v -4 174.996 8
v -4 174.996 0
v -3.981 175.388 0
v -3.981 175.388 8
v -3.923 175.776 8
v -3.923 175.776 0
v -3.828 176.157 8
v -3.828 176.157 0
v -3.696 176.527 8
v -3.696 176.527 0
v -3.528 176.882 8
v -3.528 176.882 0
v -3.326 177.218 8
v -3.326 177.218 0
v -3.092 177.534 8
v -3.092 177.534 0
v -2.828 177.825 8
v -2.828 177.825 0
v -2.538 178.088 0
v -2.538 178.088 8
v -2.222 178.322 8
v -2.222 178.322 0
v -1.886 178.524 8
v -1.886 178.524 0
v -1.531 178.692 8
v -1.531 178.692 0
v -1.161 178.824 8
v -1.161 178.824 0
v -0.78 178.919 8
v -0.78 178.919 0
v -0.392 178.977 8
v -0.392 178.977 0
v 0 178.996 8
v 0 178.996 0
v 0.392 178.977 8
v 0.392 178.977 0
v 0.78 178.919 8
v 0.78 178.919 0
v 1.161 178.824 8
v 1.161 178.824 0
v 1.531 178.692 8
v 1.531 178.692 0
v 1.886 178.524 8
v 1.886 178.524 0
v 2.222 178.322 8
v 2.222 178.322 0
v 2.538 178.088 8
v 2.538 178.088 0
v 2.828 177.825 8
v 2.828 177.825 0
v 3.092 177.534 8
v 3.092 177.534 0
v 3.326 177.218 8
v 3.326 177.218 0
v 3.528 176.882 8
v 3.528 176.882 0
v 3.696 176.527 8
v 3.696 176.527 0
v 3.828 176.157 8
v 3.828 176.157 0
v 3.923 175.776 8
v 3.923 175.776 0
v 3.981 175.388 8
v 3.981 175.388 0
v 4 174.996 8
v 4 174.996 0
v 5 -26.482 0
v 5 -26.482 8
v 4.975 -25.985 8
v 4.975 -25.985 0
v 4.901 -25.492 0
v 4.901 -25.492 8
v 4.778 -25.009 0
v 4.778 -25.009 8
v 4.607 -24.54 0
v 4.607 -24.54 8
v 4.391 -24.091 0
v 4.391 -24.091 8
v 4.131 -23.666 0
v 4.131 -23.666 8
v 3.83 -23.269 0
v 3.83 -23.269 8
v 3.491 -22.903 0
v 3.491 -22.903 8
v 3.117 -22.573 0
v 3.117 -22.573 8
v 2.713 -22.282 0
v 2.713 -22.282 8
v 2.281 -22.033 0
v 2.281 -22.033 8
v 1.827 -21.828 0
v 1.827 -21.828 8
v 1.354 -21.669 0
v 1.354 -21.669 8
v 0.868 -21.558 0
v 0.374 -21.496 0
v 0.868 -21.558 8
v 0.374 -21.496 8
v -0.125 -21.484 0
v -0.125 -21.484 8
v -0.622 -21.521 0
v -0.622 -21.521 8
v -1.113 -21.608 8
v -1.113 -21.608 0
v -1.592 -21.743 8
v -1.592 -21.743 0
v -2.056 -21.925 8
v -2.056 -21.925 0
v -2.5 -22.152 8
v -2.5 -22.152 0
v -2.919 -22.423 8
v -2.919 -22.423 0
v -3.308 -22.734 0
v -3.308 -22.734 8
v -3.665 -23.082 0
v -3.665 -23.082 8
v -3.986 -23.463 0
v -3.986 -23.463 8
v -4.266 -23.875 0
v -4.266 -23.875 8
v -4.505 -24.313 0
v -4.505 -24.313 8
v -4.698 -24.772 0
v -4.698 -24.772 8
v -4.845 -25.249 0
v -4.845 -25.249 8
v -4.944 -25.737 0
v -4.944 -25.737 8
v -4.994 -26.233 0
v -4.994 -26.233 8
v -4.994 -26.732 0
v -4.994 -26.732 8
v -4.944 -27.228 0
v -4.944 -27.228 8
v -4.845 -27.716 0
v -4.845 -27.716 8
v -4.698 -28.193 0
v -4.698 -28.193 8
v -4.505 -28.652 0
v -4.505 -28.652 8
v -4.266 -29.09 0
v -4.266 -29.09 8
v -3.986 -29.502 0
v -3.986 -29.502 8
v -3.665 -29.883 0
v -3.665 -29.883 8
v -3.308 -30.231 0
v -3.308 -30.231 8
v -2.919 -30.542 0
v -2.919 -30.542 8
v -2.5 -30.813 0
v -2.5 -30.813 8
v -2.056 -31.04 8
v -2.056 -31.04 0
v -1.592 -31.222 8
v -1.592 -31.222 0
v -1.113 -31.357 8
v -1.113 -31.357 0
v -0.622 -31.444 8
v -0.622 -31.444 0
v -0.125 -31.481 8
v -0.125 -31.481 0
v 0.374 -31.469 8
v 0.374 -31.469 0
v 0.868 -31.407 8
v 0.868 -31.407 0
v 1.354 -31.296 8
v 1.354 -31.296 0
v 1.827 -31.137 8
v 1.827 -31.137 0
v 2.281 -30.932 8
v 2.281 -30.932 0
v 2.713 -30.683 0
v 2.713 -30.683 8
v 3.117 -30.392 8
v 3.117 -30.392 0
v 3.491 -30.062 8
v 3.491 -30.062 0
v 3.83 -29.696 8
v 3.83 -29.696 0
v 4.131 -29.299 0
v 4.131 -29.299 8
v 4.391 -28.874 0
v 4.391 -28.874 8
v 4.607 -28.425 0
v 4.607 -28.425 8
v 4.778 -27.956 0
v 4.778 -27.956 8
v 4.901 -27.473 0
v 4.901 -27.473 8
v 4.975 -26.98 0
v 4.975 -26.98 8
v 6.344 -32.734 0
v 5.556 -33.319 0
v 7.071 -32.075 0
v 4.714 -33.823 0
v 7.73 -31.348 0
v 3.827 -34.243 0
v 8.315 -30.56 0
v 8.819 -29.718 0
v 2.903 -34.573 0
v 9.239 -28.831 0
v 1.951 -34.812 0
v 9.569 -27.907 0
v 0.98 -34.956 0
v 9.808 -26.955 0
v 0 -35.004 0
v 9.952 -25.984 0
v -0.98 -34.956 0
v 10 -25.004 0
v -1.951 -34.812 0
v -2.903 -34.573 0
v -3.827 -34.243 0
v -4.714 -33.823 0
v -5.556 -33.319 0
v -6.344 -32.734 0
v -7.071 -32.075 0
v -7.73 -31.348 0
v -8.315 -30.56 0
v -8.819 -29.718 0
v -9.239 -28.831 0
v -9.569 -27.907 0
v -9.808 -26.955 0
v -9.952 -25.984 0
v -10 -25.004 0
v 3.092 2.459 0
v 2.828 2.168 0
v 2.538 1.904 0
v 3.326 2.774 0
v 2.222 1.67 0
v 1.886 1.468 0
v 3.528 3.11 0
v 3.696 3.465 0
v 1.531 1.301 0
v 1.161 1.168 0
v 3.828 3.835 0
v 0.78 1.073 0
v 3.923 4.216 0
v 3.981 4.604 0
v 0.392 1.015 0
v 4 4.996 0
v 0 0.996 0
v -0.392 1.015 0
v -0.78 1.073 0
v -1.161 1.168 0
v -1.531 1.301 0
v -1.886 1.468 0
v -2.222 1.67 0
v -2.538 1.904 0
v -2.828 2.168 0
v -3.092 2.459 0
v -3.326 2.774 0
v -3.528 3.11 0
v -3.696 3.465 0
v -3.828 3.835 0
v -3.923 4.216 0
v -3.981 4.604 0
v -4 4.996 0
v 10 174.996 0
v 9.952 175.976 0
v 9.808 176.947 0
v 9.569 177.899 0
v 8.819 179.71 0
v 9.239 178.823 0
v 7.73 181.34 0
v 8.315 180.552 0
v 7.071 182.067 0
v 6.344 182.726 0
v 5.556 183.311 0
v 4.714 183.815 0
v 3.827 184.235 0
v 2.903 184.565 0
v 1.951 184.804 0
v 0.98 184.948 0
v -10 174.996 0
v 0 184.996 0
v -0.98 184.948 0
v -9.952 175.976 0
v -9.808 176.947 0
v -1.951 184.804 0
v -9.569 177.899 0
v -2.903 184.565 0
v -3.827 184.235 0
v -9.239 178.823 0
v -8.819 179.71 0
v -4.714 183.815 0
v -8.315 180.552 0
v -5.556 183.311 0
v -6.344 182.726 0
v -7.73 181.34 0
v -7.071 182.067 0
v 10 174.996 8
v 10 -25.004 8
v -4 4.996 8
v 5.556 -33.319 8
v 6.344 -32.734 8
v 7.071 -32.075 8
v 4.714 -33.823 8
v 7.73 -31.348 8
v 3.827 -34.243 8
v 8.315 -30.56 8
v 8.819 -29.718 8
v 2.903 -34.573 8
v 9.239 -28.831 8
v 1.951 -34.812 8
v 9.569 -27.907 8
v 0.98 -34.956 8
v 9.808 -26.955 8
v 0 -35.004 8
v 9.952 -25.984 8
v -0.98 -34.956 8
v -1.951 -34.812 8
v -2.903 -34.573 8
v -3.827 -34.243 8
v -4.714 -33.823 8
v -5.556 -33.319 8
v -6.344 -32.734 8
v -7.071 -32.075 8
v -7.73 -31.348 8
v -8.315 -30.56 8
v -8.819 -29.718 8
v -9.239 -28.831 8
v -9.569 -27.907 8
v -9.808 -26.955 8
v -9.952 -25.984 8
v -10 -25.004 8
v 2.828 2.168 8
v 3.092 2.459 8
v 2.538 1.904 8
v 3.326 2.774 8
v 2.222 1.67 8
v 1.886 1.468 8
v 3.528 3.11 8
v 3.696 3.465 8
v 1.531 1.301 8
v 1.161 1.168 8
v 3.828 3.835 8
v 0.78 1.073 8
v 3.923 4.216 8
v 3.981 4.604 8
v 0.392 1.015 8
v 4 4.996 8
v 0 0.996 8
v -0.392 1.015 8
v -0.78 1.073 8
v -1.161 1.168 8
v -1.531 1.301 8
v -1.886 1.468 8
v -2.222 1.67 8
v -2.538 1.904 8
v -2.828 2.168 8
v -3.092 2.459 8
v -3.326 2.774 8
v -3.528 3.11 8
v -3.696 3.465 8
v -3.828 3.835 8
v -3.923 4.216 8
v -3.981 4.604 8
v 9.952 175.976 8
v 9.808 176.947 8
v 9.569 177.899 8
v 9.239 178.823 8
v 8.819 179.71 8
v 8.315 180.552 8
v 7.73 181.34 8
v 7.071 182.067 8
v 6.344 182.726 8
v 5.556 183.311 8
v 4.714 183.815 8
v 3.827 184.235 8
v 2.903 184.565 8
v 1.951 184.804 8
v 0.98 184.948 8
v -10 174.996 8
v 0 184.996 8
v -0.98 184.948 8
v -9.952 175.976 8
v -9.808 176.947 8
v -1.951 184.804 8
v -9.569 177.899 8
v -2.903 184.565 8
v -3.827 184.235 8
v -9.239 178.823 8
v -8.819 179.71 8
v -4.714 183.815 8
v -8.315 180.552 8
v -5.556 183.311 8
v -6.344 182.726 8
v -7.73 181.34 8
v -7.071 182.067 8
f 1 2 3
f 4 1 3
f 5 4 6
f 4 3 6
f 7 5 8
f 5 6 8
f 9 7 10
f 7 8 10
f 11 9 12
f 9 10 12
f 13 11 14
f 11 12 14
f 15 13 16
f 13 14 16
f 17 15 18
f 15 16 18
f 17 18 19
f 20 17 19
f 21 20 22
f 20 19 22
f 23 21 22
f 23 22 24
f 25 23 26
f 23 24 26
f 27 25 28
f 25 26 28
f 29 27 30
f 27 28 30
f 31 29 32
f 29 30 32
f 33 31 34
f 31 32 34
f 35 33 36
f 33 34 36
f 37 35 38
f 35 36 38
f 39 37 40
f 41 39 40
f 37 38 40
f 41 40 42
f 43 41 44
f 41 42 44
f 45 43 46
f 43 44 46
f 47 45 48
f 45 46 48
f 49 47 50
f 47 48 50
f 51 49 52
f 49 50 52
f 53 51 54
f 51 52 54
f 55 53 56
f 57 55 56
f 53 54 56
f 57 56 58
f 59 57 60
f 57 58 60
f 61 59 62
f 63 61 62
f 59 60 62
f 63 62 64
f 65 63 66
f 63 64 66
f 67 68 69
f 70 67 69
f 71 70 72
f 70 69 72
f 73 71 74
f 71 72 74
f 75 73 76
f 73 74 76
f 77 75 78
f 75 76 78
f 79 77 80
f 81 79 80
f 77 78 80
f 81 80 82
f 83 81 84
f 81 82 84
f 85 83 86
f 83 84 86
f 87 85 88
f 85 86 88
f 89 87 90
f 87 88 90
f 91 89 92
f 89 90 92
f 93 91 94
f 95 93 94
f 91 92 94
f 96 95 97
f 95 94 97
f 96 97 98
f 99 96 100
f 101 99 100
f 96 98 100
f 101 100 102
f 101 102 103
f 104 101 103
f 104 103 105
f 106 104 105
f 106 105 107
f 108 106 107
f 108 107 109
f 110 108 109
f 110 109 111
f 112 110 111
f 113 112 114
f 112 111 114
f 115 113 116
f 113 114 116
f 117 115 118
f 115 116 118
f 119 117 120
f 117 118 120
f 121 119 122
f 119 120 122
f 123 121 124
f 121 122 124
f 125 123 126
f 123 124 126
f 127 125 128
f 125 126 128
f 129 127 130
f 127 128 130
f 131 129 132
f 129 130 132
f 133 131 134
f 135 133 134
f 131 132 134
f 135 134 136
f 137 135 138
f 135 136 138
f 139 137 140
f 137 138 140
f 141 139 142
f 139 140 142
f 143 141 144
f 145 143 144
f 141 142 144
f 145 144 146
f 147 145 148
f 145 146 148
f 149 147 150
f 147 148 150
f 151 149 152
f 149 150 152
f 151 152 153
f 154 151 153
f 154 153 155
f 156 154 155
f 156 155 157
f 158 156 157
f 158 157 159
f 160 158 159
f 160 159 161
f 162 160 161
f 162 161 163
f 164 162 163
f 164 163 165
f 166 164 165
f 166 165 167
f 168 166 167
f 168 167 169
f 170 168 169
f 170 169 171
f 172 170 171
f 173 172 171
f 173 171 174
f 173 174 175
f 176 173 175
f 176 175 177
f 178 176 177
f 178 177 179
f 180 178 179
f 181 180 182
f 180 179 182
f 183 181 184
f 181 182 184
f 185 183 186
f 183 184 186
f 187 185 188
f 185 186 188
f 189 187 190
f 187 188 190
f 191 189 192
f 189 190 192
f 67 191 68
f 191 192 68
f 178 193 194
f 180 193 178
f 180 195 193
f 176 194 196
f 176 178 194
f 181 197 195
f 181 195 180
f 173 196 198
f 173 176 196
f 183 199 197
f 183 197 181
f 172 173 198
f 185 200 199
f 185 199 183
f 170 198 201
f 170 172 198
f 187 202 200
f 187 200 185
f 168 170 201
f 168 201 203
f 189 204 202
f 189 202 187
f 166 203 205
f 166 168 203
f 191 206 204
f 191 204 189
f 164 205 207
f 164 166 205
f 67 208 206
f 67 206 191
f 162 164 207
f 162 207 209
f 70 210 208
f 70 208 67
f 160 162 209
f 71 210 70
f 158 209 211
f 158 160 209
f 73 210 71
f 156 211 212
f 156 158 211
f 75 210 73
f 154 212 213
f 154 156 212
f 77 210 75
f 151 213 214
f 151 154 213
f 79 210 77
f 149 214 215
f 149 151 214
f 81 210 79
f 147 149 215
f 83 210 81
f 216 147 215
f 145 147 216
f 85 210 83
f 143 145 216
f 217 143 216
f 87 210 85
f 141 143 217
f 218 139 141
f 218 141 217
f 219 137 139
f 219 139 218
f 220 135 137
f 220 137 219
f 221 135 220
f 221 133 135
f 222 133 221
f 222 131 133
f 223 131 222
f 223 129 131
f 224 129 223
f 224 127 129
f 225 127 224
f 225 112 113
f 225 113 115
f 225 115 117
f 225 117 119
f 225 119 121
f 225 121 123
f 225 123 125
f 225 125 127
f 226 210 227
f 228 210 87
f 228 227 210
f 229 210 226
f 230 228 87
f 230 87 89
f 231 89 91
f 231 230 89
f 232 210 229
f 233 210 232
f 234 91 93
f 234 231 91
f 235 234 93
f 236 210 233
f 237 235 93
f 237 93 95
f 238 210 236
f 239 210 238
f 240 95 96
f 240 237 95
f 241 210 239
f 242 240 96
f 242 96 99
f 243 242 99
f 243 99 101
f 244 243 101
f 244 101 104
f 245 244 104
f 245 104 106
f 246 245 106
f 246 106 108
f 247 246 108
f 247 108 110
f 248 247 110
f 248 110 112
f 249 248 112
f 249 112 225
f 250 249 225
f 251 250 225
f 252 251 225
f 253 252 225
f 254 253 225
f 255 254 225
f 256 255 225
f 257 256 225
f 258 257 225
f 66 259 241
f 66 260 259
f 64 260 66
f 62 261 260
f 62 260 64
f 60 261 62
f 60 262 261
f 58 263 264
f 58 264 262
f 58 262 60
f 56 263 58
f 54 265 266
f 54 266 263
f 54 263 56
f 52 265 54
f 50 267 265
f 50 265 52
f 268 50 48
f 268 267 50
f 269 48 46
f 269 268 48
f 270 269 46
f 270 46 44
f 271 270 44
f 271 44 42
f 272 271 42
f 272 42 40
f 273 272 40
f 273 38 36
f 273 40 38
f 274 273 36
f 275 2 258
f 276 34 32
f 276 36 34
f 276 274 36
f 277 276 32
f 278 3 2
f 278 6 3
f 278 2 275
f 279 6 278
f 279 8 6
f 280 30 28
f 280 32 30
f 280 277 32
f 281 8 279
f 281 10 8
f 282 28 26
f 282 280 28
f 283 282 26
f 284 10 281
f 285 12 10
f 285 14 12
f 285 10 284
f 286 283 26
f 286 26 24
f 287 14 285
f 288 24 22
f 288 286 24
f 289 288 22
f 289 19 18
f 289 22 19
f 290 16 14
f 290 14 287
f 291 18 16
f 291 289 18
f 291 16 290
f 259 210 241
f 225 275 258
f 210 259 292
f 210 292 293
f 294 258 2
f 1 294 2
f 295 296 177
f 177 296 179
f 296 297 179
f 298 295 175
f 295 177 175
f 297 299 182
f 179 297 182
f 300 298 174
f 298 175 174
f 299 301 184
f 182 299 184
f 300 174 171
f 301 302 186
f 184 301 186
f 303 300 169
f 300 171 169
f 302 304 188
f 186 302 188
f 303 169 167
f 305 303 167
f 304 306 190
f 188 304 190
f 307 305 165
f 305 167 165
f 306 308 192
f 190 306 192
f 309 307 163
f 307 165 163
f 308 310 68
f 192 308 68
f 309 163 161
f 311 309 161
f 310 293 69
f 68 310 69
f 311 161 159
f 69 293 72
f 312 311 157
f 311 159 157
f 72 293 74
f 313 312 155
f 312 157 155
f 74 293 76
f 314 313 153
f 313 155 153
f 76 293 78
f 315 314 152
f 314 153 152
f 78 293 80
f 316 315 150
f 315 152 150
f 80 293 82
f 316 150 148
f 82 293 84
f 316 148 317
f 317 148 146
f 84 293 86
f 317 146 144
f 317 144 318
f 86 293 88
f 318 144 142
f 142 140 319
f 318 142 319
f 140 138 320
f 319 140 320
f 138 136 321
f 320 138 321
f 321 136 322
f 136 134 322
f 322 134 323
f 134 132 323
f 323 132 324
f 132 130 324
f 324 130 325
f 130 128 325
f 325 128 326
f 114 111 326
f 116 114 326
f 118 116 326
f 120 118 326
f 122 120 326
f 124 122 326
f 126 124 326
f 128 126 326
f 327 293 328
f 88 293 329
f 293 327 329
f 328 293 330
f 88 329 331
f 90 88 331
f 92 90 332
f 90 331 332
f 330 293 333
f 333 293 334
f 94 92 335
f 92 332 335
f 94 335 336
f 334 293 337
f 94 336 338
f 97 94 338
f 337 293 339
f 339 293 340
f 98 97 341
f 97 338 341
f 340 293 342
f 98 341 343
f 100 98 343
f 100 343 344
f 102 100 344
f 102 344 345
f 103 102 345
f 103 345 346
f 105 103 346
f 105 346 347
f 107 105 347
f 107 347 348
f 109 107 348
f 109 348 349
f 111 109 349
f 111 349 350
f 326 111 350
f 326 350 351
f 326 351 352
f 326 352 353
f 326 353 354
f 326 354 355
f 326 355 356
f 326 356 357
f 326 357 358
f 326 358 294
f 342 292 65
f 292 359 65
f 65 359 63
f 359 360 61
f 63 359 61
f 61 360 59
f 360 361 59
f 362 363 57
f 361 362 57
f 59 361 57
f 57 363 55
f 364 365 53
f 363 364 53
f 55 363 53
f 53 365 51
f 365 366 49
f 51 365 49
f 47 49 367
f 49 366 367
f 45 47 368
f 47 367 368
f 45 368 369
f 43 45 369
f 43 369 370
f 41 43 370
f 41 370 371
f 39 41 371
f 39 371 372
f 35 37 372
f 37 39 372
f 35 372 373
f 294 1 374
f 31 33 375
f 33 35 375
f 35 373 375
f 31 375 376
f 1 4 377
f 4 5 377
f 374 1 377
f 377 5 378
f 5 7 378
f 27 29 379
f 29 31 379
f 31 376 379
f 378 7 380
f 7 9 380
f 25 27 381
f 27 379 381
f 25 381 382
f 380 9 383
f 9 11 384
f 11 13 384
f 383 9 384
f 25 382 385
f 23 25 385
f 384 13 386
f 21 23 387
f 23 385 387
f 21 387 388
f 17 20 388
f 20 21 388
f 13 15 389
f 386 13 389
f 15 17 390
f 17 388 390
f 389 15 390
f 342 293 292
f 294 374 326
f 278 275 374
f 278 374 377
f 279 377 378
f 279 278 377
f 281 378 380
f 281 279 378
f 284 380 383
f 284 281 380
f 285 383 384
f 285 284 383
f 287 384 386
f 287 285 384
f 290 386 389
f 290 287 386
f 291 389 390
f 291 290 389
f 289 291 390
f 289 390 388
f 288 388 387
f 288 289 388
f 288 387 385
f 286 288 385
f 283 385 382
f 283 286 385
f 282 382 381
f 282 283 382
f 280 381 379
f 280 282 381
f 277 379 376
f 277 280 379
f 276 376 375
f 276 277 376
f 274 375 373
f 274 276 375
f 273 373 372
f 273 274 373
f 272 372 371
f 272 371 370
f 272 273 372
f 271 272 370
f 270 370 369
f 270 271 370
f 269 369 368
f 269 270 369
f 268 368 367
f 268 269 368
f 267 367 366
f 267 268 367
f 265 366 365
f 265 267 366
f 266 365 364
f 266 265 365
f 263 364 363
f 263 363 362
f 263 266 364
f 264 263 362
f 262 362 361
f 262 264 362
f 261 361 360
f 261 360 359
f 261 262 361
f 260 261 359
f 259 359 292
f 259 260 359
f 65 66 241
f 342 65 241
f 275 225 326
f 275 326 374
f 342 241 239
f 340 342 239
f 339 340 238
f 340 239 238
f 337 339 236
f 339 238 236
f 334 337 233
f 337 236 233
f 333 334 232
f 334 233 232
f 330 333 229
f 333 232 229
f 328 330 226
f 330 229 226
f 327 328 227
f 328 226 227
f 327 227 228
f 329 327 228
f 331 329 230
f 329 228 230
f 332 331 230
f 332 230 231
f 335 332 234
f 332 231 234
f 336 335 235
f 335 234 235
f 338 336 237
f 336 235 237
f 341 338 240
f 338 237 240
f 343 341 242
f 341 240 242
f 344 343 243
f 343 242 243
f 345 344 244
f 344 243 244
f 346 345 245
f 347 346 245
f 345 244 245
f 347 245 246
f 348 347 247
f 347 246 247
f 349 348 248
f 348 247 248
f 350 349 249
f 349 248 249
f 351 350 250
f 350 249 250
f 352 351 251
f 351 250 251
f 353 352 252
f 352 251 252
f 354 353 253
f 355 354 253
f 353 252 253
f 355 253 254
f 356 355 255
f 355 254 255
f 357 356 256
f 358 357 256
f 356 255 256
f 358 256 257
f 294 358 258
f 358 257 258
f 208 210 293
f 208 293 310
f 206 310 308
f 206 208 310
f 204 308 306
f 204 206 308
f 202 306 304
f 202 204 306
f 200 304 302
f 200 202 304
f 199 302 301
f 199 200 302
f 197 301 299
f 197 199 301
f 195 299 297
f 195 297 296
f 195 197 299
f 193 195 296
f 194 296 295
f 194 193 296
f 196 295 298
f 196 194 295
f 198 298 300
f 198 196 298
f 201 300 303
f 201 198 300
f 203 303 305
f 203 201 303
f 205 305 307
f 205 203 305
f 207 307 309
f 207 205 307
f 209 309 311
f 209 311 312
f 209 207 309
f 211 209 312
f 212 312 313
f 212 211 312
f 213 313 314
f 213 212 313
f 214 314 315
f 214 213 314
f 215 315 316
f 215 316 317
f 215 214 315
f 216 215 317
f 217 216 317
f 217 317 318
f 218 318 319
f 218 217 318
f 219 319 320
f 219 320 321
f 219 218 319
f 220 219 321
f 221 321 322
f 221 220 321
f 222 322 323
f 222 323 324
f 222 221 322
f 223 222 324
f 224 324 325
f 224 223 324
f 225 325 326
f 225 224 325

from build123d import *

# Parameters (mm, degrees)
BOSS_EXTRUDE1_DEPTH = 8
SKETCH3_R           = 5
CUT_EXTRUDE1_DEPTH  = 8


with BuildPart() as part:
    # Sketch2 → Boss-Extrude1 (new body)
    with BuildSketch(Plane.XY):
        with BuildLine():
            Line((10, 174.996075103), (10, -25.003924897))
            ThreePointArc((10, -25.003924897), (0, -35.003924897), (-10, -25.003924897))
            Line((-10, -25.003924897), (-10, 174.996075103))
            ThreePointArc((-10, 174.996075103), (0, 184.996075103), (10, 174.996075103))
        make_face()
        with BuildLine():
            Line((4, 174.996075103), (4, 4.996075103))
            ThreePointArc((4, 4.996075103), (0, 0.996075103), (-4, 4.996075103))
            Line((-4, 4.996075103), (-4, 174.996075103))
            ThreePointArc((-4, 174.996075103), (0, 178.996075103), (4, 174.996075103))
        make_face(mode=Mode.SUBTRACT)
    extrude(amount=BOSS_EXTRUDE1_DEPTH)

    # Sketch3 → Cut-Extrude1 (cut)
    with BuildSketch(Plane.XY.offset(8)):
        with Locations((0, -26.482483783)):
            Circle(SKETCH3_R)
    extrude(amount=-CUT_EXTRUDE1_DEPTH, mode=Mode.SUBTRACT)


solid = part.part
